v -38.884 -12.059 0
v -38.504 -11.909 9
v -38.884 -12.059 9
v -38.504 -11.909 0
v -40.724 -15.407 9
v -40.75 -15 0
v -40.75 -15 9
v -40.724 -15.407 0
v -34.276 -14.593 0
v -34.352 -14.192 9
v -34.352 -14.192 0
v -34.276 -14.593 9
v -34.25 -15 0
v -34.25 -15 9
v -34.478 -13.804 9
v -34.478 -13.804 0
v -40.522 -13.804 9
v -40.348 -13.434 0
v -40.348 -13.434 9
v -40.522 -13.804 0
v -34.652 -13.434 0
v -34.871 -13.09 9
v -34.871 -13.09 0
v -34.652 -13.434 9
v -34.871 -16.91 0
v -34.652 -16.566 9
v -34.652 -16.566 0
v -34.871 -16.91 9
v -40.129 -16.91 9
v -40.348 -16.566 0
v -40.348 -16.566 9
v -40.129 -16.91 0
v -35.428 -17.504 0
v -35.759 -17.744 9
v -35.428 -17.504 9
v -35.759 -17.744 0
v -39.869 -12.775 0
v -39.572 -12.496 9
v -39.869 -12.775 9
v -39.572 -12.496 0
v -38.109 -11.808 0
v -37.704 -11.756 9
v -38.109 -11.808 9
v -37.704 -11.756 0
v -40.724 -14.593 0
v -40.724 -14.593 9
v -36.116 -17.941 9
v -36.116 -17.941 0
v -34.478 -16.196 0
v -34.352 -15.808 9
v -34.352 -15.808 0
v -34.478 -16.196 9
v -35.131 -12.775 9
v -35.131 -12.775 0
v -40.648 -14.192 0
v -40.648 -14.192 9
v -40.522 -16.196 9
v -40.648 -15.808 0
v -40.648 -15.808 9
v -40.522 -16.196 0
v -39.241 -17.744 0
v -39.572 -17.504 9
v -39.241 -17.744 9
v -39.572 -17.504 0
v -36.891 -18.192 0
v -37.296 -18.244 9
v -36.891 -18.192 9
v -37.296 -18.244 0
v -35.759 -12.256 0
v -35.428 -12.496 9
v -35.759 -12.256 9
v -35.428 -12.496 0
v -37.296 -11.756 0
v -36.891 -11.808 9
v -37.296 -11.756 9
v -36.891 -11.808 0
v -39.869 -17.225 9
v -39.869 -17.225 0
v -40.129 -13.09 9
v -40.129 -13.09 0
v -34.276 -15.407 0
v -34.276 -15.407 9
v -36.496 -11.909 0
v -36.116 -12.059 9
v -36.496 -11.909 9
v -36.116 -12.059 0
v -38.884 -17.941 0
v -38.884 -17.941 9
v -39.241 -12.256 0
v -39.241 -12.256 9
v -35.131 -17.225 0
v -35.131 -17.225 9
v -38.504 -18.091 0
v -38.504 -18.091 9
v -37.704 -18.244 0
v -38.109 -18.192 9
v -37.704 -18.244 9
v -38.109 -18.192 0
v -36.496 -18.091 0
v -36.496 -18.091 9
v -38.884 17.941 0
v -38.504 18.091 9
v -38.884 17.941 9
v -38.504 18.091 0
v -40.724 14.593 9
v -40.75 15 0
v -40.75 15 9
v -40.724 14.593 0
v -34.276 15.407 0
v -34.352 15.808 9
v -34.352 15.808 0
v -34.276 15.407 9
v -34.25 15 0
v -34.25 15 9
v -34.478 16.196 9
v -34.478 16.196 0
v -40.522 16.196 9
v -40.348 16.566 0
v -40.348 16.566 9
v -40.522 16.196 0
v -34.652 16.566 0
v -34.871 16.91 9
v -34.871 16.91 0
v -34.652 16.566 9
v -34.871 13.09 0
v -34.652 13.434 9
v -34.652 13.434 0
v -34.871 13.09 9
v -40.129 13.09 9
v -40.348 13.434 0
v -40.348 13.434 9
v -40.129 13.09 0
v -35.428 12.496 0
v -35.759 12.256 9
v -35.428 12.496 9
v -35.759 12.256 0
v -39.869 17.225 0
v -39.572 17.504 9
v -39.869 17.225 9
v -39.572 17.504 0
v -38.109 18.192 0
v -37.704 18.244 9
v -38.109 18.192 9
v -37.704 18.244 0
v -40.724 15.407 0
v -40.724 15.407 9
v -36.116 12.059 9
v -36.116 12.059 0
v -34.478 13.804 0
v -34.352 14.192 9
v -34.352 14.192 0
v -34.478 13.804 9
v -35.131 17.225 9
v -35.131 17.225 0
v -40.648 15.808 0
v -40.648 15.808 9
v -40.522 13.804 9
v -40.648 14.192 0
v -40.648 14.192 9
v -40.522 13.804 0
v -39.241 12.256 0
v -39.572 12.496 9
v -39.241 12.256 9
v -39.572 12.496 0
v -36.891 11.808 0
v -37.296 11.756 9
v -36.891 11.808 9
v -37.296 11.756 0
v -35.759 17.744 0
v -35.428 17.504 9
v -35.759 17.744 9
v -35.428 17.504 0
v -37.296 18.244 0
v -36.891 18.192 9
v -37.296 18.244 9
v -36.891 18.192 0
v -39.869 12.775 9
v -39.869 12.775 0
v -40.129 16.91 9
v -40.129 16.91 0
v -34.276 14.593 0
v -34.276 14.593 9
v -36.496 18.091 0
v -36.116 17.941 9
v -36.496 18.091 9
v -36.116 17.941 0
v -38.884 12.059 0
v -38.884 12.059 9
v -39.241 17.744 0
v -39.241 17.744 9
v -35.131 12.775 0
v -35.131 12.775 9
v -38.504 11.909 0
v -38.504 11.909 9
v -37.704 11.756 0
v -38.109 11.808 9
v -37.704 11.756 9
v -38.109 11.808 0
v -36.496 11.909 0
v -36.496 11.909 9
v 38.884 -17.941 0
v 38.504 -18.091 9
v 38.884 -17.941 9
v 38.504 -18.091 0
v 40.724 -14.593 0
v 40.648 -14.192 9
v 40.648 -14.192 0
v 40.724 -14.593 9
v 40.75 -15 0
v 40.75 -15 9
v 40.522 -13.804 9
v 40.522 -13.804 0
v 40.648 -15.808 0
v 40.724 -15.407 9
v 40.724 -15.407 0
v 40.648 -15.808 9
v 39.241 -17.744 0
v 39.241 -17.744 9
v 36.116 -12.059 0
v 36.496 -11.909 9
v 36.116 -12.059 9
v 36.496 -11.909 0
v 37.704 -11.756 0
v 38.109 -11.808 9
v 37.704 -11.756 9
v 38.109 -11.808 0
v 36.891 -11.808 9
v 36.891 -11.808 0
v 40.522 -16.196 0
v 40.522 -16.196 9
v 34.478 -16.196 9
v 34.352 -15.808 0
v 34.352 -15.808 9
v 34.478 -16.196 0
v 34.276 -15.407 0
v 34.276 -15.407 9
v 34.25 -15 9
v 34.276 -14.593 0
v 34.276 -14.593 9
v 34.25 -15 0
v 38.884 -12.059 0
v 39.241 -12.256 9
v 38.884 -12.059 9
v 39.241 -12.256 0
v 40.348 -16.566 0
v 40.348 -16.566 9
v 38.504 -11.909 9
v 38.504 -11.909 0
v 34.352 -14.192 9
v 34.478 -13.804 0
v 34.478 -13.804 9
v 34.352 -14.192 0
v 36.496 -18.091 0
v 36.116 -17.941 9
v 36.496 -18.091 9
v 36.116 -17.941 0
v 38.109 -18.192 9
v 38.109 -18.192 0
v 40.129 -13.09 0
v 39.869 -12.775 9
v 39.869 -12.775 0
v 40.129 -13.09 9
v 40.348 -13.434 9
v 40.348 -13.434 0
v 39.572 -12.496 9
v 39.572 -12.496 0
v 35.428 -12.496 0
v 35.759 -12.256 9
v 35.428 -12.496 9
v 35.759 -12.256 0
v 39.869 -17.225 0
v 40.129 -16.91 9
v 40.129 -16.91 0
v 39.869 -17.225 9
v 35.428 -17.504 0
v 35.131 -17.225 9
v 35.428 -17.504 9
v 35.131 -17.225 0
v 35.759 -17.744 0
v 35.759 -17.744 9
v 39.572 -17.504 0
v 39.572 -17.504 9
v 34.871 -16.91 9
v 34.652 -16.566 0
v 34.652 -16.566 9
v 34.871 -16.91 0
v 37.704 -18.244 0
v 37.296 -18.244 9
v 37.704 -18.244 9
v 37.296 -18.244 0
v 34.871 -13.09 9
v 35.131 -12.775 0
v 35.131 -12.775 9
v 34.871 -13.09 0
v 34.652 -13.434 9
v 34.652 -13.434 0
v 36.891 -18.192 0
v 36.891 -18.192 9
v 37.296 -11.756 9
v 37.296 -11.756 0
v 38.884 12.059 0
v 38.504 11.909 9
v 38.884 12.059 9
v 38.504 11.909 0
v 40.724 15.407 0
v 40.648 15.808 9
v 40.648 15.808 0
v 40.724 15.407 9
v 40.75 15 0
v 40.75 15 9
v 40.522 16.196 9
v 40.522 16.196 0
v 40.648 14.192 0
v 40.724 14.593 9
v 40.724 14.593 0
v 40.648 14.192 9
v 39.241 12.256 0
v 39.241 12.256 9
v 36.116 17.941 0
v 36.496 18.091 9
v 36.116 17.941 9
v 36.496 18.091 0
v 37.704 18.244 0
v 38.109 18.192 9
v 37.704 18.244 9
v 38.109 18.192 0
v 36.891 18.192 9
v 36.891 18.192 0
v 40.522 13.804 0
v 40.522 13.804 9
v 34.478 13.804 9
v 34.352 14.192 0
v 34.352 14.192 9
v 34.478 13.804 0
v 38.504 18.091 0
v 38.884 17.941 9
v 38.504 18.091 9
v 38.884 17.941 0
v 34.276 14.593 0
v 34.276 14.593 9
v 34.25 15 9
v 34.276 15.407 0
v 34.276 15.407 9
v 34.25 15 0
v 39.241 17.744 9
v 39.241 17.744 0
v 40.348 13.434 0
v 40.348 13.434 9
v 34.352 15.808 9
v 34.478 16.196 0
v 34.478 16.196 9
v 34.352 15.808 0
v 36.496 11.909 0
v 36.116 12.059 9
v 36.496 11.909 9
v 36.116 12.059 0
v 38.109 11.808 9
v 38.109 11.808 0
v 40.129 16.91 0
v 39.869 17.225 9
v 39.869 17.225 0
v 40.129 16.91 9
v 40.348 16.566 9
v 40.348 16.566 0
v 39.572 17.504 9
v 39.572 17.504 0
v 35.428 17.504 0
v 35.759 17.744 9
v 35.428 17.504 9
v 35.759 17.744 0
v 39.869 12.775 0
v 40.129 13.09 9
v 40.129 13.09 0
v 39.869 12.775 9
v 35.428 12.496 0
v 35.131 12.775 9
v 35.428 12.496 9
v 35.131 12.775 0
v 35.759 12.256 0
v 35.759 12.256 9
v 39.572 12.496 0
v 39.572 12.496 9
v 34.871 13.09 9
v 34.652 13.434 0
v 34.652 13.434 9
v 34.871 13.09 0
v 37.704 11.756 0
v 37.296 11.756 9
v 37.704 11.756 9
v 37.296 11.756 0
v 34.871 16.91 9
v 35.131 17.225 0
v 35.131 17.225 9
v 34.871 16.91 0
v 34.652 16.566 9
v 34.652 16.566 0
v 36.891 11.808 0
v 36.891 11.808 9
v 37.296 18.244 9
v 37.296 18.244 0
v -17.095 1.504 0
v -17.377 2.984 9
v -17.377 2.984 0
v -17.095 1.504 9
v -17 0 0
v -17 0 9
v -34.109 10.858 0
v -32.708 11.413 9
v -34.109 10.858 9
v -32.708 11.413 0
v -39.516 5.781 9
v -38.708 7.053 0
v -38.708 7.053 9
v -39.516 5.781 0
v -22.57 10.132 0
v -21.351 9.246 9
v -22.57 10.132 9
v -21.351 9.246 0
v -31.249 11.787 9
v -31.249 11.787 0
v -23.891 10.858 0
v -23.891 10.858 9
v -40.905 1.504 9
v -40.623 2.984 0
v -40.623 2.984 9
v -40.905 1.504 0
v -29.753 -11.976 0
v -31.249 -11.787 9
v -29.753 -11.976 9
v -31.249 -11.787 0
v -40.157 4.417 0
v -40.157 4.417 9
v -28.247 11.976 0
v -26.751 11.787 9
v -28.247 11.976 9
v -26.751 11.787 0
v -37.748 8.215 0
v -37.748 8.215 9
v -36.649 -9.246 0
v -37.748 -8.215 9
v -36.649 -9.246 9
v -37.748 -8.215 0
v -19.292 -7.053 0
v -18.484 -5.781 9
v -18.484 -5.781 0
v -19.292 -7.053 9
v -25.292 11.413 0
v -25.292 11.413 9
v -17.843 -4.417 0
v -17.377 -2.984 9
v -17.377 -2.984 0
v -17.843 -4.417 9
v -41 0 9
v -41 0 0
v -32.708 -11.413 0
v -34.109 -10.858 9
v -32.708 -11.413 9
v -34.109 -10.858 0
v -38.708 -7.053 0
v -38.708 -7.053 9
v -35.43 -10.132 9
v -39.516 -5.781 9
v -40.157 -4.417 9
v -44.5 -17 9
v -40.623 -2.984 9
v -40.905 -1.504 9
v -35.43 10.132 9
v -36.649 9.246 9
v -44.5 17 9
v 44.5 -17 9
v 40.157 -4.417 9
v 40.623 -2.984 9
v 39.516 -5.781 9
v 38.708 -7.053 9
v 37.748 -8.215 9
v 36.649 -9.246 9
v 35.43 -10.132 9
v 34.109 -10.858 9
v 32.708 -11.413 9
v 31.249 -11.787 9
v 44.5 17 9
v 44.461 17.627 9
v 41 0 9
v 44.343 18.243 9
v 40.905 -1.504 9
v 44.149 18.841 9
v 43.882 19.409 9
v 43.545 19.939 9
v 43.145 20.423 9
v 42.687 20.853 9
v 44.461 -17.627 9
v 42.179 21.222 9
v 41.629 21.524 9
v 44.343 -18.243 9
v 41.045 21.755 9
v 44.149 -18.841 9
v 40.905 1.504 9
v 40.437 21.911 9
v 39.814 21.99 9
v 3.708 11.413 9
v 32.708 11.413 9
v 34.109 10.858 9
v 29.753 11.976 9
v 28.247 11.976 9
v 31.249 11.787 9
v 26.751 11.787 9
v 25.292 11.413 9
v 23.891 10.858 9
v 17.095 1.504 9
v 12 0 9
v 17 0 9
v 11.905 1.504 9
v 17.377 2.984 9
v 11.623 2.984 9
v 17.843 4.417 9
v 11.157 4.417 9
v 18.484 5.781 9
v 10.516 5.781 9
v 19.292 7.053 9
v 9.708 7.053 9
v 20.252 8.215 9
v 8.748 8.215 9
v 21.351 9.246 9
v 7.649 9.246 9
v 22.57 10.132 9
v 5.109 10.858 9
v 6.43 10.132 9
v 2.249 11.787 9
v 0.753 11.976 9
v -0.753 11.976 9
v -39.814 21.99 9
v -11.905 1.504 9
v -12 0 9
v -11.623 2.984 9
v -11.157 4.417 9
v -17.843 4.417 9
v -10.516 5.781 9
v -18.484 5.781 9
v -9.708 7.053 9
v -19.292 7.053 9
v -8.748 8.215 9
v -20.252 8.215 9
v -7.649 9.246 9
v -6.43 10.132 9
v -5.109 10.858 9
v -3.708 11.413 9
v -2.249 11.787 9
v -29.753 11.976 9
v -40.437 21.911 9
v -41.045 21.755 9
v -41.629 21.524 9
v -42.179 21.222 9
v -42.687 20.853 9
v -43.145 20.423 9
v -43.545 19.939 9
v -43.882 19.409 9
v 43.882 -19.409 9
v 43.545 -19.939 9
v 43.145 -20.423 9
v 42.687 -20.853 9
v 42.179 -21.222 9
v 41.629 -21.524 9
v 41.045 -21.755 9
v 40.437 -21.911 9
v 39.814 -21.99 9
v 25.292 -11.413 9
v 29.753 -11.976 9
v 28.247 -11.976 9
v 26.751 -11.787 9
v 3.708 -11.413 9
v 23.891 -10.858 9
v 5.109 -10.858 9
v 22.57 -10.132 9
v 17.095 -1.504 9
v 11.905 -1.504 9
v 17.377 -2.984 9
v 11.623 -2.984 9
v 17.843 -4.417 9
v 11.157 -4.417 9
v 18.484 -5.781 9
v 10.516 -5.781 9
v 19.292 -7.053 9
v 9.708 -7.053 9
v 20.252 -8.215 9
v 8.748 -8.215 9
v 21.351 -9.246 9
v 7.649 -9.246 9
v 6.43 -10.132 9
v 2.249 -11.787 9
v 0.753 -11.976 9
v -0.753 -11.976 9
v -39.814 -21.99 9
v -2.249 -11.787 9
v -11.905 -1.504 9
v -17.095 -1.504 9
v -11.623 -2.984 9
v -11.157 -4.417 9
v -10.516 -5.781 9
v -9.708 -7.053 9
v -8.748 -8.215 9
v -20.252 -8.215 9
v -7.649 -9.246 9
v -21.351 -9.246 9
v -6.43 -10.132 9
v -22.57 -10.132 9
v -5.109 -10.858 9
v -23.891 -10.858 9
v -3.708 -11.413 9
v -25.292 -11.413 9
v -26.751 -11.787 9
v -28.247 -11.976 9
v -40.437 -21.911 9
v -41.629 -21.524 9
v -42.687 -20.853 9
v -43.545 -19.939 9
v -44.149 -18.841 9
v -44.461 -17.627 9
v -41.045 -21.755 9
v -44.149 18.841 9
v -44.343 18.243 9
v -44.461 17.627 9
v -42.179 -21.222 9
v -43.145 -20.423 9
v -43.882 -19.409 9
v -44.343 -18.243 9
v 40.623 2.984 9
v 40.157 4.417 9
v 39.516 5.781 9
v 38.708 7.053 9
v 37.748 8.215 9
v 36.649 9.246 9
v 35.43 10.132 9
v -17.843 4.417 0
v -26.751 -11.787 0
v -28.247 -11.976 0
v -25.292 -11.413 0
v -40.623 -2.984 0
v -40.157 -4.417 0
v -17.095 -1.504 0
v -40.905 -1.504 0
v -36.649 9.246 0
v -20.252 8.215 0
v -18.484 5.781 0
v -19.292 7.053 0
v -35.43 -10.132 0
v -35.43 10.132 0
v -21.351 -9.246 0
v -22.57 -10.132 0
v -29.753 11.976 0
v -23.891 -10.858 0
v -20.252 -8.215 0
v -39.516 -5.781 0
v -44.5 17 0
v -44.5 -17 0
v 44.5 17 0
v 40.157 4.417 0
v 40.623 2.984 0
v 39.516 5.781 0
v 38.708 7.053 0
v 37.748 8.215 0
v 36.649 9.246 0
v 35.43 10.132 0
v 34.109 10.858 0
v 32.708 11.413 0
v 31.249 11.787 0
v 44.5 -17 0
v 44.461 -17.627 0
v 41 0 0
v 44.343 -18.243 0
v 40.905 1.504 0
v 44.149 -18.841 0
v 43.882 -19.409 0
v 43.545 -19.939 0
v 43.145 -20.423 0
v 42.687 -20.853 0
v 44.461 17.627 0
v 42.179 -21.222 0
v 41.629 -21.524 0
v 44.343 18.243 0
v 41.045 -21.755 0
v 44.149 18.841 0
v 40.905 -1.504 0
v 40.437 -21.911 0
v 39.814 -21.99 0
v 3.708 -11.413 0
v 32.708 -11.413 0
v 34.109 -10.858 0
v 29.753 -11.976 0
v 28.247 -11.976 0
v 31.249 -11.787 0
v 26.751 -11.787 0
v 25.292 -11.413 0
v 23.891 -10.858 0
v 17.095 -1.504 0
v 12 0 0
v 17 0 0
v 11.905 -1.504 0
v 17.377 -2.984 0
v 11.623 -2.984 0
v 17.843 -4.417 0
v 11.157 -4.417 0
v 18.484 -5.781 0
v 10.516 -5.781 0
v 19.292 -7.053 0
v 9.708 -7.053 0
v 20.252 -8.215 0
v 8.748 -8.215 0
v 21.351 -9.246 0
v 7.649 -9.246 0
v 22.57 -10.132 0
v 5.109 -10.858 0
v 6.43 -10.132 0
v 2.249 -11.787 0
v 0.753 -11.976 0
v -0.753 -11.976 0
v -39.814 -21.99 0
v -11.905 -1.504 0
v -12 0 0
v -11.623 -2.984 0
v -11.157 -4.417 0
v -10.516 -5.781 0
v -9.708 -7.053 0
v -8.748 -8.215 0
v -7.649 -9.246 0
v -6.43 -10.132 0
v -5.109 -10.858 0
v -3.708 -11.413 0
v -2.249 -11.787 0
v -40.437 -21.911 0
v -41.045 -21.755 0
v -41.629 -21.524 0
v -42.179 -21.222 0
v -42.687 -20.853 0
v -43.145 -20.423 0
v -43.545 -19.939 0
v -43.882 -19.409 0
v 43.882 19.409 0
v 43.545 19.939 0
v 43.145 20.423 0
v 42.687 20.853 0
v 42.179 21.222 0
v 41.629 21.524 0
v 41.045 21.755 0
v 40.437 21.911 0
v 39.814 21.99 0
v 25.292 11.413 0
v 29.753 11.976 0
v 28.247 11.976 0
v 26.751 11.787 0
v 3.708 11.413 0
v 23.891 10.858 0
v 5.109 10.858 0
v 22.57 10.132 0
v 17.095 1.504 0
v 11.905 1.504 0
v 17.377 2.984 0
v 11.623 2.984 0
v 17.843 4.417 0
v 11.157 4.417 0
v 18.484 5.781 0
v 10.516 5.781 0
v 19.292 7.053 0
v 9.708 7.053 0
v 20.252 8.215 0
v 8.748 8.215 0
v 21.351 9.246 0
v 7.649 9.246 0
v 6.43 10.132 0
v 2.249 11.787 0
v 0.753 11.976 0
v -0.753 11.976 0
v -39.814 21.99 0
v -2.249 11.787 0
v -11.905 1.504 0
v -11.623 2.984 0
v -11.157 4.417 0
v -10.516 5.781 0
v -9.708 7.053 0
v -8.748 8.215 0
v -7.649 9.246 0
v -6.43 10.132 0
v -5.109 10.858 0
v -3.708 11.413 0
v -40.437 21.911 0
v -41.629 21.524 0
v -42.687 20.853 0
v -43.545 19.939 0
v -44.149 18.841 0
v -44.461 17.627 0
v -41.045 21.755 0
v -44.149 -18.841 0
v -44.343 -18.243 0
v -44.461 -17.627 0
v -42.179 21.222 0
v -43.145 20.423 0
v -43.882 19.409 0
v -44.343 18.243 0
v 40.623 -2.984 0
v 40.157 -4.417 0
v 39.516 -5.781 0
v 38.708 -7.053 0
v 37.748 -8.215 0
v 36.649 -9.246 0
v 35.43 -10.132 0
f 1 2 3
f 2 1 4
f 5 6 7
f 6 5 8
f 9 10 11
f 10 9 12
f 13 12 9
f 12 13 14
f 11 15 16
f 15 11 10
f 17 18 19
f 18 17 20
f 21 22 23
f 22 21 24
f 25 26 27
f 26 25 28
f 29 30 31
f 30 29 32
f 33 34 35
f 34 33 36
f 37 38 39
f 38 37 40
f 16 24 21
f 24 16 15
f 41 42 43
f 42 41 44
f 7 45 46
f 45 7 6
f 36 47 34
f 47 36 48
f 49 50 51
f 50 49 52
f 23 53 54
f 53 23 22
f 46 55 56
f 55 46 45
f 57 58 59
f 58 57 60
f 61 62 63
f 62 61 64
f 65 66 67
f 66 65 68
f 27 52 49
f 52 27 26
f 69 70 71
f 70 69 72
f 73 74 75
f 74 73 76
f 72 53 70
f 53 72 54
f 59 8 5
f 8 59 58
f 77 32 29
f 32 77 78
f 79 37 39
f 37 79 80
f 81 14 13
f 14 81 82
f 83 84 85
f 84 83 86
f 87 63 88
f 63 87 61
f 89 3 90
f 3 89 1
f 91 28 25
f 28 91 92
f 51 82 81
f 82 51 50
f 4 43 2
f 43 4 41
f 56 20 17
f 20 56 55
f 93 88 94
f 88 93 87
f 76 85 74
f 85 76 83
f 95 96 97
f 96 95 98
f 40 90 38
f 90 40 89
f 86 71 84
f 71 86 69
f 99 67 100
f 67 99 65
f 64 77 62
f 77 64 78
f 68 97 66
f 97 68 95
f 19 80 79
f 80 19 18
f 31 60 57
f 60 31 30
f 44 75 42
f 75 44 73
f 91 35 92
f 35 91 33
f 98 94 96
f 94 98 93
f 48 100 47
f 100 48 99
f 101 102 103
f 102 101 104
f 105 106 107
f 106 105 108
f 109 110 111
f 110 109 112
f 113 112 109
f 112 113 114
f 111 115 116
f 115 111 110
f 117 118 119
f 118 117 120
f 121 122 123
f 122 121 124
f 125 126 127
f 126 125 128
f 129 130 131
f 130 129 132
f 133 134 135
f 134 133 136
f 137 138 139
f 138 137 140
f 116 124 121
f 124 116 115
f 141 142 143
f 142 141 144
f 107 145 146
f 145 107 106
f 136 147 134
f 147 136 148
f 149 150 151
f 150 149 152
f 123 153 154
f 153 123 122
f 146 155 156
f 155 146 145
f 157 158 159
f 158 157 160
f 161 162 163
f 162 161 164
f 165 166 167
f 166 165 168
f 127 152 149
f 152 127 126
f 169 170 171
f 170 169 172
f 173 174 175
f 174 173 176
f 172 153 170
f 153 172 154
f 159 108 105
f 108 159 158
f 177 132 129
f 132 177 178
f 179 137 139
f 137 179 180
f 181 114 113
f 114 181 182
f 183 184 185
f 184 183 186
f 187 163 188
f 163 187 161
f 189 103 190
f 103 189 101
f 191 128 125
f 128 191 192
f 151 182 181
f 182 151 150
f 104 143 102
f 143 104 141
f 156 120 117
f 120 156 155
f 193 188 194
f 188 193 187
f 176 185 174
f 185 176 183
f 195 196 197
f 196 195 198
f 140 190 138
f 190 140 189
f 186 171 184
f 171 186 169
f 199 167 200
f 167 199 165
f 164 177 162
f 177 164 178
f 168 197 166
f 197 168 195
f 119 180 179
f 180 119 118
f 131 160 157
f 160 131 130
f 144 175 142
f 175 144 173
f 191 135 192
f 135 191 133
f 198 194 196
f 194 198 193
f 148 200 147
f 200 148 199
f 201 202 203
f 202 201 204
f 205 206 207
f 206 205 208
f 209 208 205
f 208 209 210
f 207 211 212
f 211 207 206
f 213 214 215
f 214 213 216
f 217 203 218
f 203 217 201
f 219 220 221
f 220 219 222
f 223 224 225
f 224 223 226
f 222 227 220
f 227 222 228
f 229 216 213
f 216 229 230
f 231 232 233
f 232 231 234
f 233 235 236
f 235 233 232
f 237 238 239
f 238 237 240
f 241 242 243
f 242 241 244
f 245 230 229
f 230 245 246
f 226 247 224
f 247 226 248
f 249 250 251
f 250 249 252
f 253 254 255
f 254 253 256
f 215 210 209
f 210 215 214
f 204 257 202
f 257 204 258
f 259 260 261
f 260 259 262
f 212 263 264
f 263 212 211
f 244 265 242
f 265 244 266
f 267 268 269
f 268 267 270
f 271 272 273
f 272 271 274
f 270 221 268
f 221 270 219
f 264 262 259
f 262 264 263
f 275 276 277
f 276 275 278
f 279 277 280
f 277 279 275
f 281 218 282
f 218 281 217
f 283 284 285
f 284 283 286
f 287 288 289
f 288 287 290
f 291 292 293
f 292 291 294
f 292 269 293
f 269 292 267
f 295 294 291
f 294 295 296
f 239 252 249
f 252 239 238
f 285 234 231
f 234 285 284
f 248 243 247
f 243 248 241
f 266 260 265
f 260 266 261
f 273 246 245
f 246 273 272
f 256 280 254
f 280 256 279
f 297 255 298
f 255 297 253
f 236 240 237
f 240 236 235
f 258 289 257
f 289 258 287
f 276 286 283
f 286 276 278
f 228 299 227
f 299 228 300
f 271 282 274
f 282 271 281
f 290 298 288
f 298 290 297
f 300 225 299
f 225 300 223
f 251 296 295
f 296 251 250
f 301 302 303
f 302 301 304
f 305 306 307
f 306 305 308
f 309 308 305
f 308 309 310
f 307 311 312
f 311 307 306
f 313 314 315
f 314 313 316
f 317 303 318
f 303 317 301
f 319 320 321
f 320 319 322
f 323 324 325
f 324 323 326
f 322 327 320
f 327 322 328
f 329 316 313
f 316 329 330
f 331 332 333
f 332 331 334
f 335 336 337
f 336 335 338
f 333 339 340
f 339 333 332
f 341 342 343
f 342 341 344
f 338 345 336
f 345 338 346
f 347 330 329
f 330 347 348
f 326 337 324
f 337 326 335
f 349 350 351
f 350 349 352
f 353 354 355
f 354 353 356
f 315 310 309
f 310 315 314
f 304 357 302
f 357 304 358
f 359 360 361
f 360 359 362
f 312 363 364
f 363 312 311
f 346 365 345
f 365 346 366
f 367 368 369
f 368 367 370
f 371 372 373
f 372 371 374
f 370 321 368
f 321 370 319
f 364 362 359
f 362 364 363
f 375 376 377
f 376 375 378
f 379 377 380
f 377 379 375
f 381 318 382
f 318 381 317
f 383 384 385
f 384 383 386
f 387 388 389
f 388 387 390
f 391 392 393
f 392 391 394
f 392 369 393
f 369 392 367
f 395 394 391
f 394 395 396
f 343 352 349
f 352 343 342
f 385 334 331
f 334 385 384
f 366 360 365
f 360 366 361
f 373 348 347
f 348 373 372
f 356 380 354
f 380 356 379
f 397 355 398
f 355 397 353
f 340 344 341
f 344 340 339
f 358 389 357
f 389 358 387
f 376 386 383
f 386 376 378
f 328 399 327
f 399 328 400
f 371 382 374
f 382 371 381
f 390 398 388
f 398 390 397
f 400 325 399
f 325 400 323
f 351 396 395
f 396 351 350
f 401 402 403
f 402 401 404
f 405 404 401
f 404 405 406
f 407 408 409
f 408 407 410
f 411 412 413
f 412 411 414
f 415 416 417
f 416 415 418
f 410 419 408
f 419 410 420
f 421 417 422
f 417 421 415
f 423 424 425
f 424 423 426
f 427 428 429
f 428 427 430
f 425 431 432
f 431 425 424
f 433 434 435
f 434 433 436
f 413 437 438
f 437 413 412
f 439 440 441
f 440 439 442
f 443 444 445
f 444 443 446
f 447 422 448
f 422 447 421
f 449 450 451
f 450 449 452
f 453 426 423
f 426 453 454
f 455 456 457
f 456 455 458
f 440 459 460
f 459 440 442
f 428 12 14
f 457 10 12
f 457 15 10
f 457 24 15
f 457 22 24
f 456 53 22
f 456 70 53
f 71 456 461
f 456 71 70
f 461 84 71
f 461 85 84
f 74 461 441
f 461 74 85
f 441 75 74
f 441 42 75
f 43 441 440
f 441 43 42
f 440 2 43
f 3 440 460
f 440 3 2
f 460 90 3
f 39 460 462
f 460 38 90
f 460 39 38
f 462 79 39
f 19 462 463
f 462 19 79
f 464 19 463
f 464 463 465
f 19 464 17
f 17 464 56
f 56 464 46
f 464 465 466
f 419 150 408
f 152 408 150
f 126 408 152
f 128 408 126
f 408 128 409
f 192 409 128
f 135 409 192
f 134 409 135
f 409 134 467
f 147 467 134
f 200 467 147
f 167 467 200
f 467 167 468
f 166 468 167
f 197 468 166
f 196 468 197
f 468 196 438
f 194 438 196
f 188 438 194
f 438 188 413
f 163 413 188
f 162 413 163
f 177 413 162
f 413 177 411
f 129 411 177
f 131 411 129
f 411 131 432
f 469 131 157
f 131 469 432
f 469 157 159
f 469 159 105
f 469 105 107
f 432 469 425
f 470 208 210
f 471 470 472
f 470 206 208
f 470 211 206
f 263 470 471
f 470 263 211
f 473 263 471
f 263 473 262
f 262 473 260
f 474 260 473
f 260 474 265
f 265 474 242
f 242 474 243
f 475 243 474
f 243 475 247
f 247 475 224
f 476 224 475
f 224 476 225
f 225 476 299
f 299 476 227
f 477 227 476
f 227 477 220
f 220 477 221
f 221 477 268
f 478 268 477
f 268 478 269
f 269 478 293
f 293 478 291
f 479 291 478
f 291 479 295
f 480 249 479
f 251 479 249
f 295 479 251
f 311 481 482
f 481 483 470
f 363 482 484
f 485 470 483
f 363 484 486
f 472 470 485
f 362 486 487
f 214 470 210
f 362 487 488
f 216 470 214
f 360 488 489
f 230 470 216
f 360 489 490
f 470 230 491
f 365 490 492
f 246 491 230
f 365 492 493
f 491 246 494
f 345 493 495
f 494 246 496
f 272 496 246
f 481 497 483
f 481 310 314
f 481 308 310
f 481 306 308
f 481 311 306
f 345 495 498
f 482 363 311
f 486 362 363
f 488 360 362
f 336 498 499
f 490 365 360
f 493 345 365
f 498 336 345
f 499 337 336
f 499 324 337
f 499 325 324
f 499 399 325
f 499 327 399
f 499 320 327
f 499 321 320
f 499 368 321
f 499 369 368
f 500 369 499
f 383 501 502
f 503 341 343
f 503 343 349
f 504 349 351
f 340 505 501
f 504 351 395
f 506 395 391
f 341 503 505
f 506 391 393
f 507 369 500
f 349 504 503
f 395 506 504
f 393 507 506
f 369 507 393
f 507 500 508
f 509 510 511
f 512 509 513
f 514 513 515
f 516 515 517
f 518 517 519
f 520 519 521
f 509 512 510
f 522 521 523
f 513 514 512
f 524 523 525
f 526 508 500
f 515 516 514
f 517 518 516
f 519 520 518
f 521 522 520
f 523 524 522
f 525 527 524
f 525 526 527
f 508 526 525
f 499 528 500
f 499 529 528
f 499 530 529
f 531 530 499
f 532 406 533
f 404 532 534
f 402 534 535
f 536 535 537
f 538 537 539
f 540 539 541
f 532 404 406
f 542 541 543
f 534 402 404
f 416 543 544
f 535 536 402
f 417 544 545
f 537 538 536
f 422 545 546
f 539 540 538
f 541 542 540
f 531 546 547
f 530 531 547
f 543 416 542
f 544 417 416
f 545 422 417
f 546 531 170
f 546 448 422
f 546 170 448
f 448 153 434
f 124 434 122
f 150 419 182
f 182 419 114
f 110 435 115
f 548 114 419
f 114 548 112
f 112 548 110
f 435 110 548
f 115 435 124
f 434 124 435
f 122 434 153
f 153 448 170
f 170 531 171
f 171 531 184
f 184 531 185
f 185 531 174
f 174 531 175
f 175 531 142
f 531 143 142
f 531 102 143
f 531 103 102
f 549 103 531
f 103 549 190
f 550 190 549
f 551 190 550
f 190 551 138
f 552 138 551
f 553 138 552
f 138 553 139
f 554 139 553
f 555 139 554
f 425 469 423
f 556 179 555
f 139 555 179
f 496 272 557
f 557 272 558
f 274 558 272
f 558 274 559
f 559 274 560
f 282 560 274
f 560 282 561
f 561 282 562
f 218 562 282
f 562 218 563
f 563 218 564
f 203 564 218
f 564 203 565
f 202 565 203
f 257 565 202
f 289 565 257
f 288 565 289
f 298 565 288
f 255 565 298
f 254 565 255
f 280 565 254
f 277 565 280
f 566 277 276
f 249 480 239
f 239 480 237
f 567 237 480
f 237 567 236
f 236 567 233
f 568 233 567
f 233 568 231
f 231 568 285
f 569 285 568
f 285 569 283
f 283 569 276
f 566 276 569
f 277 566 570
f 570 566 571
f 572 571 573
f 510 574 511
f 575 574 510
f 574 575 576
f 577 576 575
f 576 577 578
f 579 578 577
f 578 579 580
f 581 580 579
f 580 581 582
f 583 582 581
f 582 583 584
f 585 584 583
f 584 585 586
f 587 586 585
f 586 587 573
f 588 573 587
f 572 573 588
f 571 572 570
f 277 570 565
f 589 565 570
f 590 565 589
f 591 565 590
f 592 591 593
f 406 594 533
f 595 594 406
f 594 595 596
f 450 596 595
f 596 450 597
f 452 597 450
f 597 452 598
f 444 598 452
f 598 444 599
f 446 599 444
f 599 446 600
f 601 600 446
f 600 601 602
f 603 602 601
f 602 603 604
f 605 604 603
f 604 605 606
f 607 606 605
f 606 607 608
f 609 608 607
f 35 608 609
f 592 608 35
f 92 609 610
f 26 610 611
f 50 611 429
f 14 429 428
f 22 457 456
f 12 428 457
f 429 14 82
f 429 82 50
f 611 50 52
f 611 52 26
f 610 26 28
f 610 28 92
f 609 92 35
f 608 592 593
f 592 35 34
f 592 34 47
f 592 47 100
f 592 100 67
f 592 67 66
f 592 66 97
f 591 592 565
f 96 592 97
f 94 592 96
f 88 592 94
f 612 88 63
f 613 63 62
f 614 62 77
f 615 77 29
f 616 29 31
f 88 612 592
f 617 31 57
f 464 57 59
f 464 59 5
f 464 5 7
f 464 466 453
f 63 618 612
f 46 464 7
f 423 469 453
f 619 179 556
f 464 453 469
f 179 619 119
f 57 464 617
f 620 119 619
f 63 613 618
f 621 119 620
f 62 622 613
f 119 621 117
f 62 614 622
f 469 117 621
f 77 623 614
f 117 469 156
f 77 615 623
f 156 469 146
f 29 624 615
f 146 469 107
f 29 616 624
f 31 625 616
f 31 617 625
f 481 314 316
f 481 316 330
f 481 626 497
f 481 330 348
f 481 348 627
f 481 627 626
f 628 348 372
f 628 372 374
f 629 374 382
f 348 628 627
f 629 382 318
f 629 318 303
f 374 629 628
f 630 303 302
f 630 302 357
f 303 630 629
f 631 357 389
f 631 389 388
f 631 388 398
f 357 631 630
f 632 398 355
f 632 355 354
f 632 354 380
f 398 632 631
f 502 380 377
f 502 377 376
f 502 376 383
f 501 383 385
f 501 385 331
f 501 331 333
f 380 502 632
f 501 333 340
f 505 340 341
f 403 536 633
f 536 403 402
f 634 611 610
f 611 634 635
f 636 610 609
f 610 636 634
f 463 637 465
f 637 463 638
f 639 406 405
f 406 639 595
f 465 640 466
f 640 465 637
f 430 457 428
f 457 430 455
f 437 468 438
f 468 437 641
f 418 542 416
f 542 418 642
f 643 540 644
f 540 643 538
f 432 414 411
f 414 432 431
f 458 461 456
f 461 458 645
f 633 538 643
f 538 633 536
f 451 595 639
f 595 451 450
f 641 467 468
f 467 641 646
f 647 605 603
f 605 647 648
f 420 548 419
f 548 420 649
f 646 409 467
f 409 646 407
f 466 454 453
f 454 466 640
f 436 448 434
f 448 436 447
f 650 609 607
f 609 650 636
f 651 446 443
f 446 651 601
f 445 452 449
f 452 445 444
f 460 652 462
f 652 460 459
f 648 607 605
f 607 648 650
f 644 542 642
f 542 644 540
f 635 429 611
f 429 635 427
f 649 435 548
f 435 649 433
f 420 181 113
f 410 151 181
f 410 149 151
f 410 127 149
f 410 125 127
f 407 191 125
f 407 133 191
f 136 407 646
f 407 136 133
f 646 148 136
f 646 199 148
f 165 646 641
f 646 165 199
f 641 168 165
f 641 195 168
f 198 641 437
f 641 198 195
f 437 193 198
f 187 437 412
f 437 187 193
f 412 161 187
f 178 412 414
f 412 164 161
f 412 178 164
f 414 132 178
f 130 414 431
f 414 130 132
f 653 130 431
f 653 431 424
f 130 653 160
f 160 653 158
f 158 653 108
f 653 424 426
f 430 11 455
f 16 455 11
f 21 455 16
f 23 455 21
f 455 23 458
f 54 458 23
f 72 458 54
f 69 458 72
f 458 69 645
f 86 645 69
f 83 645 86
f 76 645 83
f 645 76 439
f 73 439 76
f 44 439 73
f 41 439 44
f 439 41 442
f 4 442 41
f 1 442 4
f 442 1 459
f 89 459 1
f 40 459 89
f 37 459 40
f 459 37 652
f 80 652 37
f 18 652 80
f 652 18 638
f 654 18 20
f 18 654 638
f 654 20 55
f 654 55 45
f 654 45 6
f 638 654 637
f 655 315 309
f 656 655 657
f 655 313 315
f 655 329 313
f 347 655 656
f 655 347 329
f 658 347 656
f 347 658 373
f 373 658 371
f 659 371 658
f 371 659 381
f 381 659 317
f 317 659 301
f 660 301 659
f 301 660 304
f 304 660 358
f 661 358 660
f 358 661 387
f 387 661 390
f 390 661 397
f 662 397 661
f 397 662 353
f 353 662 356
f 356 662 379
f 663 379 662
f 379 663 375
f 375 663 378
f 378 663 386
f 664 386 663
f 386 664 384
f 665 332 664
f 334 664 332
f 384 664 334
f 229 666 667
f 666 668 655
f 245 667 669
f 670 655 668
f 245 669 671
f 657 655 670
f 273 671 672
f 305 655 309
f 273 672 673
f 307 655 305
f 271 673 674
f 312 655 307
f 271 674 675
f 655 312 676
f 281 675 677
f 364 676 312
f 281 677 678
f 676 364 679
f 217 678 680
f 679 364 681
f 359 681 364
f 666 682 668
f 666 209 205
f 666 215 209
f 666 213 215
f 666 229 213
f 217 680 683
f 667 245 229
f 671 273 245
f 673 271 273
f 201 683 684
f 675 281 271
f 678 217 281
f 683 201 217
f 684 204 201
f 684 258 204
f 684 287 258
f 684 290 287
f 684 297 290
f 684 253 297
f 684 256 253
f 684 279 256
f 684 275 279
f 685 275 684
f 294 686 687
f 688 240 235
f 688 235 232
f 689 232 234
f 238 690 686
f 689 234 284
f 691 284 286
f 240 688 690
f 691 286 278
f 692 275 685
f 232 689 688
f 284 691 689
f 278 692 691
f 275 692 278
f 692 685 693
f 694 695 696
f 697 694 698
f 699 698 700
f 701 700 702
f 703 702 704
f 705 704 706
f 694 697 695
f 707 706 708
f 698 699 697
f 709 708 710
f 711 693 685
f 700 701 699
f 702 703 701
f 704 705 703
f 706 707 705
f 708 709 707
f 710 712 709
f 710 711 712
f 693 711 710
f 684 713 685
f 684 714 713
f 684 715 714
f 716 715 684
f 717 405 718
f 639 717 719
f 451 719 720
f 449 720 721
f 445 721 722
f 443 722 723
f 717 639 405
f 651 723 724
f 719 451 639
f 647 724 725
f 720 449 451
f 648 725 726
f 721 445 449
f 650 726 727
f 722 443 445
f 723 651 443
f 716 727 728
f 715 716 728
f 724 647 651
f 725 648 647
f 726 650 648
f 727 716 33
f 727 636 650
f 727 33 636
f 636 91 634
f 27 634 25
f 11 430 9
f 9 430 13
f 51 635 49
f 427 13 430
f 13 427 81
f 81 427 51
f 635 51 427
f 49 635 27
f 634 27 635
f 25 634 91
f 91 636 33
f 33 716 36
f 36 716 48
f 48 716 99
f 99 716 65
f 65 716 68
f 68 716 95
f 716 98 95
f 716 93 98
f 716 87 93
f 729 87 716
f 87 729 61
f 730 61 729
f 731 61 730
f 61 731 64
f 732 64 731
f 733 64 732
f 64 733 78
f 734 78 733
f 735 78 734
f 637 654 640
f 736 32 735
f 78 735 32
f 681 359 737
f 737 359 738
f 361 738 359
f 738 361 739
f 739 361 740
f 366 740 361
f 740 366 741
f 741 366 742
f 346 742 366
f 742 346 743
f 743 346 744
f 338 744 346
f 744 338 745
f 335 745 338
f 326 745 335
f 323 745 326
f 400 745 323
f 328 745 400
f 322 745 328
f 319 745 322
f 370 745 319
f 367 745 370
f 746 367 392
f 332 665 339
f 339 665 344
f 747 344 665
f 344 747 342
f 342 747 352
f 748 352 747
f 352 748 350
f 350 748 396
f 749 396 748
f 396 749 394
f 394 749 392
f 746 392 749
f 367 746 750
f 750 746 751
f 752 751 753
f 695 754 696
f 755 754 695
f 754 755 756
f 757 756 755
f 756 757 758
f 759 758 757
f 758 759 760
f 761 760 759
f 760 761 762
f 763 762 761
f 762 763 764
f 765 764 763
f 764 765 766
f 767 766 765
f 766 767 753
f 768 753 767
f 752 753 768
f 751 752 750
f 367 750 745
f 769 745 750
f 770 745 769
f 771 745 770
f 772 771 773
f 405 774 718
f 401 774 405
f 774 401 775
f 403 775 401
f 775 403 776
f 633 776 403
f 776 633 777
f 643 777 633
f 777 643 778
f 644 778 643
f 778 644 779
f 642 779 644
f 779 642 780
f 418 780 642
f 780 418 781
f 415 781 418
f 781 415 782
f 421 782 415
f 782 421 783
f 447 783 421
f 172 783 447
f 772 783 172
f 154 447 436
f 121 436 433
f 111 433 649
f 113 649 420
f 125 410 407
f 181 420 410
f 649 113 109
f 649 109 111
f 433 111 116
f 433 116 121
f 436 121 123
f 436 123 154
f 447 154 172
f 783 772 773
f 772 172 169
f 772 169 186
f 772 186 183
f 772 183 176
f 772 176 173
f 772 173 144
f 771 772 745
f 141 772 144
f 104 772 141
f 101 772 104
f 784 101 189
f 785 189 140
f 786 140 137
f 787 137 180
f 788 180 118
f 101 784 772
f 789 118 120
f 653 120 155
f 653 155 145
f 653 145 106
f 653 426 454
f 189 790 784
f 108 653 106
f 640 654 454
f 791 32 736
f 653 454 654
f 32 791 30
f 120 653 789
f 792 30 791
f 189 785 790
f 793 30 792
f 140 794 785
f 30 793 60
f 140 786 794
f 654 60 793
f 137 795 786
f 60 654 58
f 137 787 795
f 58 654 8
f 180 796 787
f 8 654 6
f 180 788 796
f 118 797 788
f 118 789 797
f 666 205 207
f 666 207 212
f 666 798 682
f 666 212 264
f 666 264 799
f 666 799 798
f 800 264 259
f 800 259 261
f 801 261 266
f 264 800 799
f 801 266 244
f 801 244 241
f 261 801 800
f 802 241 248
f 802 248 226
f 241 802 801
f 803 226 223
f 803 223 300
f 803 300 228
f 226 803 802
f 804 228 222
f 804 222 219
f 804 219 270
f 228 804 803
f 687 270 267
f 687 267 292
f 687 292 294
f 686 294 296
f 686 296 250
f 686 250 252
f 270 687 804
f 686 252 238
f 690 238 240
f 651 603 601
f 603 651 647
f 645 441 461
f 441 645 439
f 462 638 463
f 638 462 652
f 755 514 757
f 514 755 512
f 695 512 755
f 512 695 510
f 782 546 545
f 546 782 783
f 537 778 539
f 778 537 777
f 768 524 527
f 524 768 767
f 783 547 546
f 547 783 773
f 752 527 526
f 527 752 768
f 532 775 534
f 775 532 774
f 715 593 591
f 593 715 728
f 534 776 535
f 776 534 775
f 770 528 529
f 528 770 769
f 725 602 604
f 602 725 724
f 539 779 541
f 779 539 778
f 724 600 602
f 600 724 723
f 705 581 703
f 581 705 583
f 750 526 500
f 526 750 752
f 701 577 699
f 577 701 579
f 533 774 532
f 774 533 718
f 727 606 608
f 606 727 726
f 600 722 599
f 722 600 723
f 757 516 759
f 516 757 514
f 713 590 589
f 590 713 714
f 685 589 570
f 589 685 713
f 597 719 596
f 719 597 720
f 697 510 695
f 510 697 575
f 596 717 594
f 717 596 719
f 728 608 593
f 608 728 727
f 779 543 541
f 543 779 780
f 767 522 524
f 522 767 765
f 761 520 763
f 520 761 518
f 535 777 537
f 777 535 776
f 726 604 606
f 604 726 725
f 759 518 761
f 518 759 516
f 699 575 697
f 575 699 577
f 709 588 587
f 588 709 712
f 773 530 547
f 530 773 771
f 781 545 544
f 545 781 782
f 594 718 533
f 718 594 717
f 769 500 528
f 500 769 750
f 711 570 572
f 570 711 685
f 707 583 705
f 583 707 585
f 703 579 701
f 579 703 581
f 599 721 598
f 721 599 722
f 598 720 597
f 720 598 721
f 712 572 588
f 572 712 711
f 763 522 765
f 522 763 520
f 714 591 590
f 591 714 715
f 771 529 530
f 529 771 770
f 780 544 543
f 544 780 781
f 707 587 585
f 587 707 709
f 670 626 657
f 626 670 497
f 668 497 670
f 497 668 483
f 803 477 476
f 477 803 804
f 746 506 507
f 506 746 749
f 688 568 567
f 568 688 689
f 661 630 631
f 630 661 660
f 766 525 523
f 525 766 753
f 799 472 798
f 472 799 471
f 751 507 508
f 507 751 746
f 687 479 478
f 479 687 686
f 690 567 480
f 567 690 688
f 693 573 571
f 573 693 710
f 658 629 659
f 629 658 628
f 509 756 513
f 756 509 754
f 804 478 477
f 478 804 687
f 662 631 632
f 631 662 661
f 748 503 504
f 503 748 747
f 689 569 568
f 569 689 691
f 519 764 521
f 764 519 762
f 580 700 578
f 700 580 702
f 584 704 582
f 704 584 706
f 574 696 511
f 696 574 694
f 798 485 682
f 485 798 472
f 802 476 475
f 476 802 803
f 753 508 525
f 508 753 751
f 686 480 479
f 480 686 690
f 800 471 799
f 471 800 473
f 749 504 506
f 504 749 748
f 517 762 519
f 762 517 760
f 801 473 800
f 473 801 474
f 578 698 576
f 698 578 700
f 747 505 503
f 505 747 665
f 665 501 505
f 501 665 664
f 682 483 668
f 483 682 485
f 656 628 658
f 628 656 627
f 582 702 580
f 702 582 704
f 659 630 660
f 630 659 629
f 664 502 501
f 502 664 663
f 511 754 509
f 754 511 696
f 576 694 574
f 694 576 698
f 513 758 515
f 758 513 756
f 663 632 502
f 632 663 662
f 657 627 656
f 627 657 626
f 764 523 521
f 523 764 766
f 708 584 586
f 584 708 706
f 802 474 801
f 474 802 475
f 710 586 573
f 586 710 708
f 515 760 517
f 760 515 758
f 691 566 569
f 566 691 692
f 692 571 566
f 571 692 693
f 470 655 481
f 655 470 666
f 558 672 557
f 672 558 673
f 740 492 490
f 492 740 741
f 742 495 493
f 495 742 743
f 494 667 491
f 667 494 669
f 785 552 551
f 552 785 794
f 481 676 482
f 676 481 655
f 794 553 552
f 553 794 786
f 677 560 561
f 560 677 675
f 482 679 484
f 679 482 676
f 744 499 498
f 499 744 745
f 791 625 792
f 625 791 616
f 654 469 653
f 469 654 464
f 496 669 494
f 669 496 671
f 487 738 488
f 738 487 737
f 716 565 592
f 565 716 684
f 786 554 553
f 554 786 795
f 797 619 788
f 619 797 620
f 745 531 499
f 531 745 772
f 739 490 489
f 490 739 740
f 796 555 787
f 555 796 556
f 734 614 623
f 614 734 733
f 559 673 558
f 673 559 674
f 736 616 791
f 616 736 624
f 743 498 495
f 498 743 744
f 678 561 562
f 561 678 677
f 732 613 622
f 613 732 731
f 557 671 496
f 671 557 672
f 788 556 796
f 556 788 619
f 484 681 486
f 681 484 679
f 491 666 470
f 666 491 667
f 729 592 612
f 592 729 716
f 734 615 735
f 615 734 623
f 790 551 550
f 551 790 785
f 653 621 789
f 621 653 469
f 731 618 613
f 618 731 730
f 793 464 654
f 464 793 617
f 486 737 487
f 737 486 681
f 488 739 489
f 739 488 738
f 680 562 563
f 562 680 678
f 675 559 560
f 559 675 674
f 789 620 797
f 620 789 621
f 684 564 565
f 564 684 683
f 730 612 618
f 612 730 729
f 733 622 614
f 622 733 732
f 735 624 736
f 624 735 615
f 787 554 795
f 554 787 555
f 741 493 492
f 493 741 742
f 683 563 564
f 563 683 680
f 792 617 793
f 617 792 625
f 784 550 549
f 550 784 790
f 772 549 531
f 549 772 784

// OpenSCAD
$fn = 50;


difference() {
	union() {
		hull() {
			translate(v = [-39.5000000000, 17.0000000000, 0]) {
				cylinder(h = 9, r = 5);
			}
			translate(v = [39.5000000000, 17.0000000000, 0]) {
				cylinder(h = 9, r = 5);
			}
			translate(v = [-39.5000000000, -17.0000000000, 0]) {
				cylinder(h = 9, r = 5);
			}
			translate(v = [39.5000000000, -17.0000000000, 0]) {
				cylinder(h = 9, r = 5);
			}
		}
	}
	union() {
		#translate(v = [-37.5000000000, -15.0000000000, -100.0000000000]) {
			cylinder(h = 200, r = 3.2500000000);
		}
		#translate(v = [-37.5000000000, 15.0000000000, -100.0000000000]) {
			cylinder(h = 200, r = 3.2500000000);
		}
		#translate(v = [37.5000000000, -15.0000000000, -100.0000000000]) {
			cylinder(h = 200, r = 3.2500000000);
		}
		#translate(v = [37.5000000000, 15.0000000000, -100.0000000000]) {
			cylinder(h = 200, r = 3.2500000000);
		}
		#translate(v = [-29.0000000000, 0, 0]) {
			cylinder(h = 9, r = 12.0000000000);
		}
		#cylinder(h = 9, r = 12.0000000000);
		#translate(v = [29.0000000000, 0, 0]) {
			cylinder(h = 9, r = 12.0000000000);
		}
	}
}
